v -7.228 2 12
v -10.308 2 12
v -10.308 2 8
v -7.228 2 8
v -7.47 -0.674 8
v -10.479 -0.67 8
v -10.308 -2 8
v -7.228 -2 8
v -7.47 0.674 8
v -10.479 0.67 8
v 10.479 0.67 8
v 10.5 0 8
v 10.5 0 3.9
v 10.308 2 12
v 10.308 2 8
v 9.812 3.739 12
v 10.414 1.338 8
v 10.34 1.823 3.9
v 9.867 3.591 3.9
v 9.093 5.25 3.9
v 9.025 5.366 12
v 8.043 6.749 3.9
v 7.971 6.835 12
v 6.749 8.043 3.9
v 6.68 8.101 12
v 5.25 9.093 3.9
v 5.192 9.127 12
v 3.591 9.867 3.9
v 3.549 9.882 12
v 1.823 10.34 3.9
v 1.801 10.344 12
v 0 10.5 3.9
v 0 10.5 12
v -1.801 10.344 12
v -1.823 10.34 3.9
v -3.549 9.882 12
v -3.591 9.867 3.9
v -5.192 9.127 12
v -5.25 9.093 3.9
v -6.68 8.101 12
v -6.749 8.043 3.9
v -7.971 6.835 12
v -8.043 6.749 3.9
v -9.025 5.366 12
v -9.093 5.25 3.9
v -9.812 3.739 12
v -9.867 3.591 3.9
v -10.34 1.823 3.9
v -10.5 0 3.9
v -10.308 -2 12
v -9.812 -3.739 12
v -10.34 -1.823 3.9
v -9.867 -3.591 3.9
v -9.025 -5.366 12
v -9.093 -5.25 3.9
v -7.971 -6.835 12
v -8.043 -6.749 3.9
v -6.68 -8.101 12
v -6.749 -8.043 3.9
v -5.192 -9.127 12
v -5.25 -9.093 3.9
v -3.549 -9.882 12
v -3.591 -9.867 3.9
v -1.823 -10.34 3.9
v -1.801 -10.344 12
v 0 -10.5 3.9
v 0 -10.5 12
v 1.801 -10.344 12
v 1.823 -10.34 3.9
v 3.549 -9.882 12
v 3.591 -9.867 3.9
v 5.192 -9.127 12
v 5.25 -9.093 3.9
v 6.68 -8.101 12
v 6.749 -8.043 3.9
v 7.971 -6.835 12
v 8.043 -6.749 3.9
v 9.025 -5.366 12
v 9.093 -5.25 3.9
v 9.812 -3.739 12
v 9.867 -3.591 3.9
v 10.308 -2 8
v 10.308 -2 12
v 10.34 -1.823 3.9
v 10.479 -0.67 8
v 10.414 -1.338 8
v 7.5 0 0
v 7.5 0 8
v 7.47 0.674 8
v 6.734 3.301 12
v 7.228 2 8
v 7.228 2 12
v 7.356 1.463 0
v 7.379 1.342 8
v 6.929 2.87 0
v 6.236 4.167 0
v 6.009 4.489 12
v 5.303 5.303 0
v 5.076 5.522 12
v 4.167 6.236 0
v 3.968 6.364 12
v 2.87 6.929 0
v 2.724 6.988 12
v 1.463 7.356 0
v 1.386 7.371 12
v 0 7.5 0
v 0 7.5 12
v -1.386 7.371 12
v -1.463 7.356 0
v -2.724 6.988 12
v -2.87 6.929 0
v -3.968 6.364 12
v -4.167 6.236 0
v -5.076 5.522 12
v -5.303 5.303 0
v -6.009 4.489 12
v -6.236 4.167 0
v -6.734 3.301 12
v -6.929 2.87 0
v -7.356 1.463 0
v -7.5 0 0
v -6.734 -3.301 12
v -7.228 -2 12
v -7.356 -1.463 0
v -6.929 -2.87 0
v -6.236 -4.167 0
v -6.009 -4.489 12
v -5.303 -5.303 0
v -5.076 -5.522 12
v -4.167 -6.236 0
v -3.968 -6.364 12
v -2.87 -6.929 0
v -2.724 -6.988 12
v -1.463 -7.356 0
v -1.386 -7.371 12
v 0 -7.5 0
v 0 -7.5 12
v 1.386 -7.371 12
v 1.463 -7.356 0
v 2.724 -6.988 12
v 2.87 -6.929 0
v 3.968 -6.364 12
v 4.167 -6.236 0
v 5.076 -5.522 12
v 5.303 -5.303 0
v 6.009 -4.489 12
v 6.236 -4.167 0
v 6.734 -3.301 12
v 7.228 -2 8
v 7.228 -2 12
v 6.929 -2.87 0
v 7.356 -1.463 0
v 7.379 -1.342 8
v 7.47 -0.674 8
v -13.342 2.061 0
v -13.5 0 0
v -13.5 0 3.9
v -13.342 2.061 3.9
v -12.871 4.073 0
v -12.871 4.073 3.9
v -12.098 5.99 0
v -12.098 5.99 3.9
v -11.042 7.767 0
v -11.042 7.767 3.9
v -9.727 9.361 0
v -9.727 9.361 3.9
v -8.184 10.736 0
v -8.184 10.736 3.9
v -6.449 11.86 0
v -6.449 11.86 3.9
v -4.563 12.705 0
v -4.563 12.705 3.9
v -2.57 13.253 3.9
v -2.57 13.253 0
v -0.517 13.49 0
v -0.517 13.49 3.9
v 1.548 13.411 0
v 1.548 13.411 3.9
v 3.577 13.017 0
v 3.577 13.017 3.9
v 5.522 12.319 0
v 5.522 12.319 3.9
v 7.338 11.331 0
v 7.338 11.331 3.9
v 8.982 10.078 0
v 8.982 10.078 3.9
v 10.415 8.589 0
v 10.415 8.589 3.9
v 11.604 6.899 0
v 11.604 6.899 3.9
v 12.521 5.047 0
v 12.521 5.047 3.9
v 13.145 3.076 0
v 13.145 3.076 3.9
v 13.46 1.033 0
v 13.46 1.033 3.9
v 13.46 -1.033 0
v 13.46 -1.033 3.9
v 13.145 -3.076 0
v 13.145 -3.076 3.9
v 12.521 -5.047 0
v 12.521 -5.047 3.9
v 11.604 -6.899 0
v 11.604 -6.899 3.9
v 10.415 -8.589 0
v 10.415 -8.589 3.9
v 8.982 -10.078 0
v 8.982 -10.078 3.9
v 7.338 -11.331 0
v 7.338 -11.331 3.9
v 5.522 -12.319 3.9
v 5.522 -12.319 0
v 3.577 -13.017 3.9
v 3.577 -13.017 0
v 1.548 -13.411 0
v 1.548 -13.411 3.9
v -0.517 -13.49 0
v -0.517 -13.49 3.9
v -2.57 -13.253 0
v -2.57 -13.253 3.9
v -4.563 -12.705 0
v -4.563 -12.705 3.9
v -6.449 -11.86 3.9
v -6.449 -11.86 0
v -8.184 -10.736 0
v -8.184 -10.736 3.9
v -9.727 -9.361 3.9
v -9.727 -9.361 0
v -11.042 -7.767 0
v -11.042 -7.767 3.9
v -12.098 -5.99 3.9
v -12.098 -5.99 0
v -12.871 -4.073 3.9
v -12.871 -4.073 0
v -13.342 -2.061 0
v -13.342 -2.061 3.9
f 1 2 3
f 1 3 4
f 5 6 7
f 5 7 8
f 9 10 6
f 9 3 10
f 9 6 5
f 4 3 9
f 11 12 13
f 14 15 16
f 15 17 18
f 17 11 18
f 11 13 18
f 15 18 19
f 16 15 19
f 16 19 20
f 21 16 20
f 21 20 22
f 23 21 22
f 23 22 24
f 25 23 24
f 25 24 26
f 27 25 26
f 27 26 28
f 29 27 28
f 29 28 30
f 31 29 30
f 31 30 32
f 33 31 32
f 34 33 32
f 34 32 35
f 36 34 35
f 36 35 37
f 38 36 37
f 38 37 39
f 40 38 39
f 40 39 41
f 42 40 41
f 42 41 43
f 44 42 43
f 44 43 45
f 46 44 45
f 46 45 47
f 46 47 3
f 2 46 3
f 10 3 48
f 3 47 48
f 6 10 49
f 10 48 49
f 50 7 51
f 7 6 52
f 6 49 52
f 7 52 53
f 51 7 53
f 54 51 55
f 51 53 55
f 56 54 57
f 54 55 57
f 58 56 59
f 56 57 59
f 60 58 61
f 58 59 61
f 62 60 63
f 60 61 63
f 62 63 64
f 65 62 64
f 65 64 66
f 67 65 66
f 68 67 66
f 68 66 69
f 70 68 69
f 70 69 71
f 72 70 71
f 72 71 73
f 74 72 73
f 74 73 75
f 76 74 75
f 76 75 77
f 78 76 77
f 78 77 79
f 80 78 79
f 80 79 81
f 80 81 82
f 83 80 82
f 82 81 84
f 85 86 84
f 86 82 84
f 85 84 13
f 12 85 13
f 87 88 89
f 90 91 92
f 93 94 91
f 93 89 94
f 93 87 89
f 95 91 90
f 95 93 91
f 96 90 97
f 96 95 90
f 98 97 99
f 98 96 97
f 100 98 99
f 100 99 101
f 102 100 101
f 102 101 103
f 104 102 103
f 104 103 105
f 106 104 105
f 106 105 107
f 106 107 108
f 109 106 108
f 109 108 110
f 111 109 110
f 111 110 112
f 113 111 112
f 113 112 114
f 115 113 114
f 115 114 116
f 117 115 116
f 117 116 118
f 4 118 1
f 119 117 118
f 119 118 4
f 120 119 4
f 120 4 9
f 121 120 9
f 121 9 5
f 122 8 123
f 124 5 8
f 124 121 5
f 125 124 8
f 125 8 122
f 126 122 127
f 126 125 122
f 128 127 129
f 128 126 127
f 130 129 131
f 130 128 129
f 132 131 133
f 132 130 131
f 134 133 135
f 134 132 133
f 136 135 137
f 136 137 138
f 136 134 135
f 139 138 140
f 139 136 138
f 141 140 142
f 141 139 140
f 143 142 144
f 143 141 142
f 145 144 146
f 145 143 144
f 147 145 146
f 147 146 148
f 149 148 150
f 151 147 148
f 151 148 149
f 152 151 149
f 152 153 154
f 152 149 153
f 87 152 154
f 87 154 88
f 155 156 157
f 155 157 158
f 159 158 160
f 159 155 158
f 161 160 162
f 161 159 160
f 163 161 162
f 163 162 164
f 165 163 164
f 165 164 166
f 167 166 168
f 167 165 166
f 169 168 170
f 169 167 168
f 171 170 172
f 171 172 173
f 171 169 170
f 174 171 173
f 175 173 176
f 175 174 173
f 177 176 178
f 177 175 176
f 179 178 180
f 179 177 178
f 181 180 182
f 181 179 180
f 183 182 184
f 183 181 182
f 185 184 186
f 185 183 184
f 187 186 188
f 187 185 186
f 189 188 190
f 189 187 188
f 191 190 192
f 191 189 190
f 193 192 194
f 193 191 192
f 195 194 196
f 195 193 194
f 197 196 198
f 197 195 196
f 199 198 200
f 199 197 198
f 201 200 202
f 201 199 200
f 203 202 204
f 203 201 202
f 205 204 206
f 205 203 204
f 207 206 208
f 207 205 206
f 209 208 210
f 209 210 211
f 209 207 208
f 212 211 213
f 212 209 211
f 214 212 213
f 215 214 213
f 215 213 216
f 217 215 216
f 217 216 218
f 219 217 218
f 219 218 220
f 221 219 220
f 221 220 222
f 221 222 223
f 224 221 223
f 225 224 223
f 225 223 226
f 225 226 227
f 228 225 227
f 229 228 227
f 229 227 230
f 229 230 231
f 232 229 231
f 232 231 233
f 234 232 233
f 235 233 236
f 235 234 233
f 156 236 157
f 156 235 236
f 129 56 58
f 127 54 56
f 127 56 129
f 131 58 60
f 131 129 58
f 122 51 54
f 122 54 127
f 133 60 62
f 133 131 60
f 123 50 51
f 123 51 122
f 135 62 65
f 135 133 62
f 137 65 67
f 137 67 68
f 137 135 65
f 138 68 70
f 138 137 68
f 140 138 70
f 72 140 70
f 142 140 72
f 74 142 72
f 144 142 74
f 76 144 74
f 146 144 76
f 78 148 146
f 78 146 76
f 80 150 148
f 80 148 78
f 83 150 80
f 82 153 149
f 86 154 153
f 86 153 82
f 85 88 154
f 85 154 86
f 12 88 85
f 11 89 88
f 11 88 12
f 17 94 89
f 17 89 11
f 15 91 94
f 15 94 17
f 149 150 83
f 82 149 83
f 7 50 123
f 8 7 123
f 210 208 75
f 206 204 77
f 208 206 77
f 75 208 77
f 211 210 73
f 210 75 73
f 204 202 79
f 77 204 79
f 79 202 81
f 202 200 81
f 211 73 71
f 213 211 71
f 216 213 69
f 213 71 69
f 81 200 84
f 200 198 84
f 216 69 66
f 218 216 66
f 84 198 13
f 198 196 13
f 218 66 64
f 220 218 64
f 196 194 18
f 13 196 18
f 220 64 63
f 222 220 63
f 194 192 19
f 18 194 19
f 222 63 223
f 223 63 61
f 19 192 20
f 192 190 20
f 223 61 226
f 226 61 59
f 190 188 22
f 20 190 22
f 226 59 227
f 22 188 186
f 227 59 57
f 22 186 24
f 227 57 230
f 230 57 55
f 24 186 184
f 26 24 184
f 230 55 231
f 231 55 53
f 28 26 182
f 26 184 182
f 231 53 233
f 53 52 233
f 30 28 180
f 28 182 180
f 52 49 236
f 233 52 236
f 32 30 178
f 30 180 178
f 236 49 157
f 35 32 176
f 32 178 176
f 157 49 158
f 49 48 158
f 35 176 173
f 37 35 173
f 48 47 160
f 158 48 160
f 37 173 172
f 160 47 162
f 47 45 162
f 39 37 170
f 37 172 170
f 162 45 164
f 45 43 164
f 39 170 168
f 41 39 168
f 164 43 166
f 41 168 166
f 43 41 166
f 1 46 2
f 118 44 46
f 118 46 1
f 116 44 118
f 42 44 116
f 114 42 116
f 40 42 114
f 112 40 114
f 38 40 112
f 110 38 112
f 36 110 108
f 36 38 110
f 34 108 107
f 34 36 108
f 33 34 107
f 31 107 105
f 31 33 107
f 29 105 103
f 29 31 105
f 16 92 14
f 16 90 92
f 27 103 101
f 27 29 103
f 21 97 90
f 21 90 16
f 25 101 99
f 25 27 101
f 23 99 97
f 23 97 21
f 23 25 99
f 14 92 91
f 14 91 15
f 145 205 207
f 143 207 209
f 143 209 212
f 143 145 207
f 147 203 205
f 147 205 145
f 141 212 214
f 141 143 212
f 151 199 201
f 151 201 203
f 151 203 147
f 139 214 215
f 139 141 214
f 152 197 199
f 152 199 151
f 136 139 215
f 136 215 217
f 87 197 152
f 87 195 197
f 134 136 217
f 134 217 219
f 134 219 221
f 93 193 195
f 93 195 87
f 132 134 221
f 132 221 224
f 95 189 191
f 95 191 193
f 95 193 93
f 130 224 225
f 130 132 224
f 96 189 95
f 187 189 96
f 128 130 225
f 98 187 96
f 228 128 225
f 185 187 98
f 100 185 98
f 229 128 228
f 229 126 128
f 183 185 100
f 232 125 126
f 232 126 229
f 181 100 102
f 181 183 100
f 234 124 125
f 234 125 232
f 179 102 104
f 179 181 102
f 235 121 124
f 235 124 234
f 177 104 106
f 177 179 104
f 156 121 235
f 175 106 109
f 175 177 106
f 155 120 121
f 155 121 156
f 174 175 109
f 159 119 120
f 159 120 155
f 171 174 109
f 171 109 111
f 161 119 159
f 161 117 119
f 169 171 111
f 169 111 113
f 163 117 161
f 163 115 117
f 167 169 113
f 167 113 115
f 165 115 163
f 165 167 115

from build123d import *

# Parameters (mm, degrees)
SKETCH_1_R          = 10.5
SKETCH_1_R_2        = 7.5
EXTRUDE_1_DEPTH     = 12
SKETCH_2_R          = 13.5
SKETCH_2_R_2        = 10.5
EXTRUDE_2_DEPTH     = 3.9
SKETCH_3_W          = 25.92950511
SKETCH_3_H          = 4
CUT_EXTRUDE_1_DEPTH = 4


with BuildPart() as part:
    # 草图1 → 拉伸-薄壁1 (new body)
    with BuildSketch(Plane.XY):
        Circle(SKETCH_1_R)
        Circle(SKETCH_1_R_2, mode=Mode.SUBTRACT)
    extrude(amount=EXTRUDE_1_DEPTH)

    # 草图2 → 拉伸-薄壁2 (add)
    with BuildSketch(Plane(origin=(0, 0, 0), x_dir=(-1, 0, 0), z_dir=(0, 0, -1))):
        Circle(SKETCH_2_R)
        Circle(SKETCH_2_R_2, mode=Mode.SUBTRACT)
    extrude(amount=-EXTRUDE_2_DEPTH)

    # 草图3 → 切除-拉伸1 (cut)
    with BuildSketch(Plane.XY.offset(12)):
        Rectangle(SKETCH_3_W, SKETCH_3_H)
    extrude(amount=-CUT_EXTRUDE_1_DEPTH, mode=Mode.SUBTRACT)


solid = part.part
